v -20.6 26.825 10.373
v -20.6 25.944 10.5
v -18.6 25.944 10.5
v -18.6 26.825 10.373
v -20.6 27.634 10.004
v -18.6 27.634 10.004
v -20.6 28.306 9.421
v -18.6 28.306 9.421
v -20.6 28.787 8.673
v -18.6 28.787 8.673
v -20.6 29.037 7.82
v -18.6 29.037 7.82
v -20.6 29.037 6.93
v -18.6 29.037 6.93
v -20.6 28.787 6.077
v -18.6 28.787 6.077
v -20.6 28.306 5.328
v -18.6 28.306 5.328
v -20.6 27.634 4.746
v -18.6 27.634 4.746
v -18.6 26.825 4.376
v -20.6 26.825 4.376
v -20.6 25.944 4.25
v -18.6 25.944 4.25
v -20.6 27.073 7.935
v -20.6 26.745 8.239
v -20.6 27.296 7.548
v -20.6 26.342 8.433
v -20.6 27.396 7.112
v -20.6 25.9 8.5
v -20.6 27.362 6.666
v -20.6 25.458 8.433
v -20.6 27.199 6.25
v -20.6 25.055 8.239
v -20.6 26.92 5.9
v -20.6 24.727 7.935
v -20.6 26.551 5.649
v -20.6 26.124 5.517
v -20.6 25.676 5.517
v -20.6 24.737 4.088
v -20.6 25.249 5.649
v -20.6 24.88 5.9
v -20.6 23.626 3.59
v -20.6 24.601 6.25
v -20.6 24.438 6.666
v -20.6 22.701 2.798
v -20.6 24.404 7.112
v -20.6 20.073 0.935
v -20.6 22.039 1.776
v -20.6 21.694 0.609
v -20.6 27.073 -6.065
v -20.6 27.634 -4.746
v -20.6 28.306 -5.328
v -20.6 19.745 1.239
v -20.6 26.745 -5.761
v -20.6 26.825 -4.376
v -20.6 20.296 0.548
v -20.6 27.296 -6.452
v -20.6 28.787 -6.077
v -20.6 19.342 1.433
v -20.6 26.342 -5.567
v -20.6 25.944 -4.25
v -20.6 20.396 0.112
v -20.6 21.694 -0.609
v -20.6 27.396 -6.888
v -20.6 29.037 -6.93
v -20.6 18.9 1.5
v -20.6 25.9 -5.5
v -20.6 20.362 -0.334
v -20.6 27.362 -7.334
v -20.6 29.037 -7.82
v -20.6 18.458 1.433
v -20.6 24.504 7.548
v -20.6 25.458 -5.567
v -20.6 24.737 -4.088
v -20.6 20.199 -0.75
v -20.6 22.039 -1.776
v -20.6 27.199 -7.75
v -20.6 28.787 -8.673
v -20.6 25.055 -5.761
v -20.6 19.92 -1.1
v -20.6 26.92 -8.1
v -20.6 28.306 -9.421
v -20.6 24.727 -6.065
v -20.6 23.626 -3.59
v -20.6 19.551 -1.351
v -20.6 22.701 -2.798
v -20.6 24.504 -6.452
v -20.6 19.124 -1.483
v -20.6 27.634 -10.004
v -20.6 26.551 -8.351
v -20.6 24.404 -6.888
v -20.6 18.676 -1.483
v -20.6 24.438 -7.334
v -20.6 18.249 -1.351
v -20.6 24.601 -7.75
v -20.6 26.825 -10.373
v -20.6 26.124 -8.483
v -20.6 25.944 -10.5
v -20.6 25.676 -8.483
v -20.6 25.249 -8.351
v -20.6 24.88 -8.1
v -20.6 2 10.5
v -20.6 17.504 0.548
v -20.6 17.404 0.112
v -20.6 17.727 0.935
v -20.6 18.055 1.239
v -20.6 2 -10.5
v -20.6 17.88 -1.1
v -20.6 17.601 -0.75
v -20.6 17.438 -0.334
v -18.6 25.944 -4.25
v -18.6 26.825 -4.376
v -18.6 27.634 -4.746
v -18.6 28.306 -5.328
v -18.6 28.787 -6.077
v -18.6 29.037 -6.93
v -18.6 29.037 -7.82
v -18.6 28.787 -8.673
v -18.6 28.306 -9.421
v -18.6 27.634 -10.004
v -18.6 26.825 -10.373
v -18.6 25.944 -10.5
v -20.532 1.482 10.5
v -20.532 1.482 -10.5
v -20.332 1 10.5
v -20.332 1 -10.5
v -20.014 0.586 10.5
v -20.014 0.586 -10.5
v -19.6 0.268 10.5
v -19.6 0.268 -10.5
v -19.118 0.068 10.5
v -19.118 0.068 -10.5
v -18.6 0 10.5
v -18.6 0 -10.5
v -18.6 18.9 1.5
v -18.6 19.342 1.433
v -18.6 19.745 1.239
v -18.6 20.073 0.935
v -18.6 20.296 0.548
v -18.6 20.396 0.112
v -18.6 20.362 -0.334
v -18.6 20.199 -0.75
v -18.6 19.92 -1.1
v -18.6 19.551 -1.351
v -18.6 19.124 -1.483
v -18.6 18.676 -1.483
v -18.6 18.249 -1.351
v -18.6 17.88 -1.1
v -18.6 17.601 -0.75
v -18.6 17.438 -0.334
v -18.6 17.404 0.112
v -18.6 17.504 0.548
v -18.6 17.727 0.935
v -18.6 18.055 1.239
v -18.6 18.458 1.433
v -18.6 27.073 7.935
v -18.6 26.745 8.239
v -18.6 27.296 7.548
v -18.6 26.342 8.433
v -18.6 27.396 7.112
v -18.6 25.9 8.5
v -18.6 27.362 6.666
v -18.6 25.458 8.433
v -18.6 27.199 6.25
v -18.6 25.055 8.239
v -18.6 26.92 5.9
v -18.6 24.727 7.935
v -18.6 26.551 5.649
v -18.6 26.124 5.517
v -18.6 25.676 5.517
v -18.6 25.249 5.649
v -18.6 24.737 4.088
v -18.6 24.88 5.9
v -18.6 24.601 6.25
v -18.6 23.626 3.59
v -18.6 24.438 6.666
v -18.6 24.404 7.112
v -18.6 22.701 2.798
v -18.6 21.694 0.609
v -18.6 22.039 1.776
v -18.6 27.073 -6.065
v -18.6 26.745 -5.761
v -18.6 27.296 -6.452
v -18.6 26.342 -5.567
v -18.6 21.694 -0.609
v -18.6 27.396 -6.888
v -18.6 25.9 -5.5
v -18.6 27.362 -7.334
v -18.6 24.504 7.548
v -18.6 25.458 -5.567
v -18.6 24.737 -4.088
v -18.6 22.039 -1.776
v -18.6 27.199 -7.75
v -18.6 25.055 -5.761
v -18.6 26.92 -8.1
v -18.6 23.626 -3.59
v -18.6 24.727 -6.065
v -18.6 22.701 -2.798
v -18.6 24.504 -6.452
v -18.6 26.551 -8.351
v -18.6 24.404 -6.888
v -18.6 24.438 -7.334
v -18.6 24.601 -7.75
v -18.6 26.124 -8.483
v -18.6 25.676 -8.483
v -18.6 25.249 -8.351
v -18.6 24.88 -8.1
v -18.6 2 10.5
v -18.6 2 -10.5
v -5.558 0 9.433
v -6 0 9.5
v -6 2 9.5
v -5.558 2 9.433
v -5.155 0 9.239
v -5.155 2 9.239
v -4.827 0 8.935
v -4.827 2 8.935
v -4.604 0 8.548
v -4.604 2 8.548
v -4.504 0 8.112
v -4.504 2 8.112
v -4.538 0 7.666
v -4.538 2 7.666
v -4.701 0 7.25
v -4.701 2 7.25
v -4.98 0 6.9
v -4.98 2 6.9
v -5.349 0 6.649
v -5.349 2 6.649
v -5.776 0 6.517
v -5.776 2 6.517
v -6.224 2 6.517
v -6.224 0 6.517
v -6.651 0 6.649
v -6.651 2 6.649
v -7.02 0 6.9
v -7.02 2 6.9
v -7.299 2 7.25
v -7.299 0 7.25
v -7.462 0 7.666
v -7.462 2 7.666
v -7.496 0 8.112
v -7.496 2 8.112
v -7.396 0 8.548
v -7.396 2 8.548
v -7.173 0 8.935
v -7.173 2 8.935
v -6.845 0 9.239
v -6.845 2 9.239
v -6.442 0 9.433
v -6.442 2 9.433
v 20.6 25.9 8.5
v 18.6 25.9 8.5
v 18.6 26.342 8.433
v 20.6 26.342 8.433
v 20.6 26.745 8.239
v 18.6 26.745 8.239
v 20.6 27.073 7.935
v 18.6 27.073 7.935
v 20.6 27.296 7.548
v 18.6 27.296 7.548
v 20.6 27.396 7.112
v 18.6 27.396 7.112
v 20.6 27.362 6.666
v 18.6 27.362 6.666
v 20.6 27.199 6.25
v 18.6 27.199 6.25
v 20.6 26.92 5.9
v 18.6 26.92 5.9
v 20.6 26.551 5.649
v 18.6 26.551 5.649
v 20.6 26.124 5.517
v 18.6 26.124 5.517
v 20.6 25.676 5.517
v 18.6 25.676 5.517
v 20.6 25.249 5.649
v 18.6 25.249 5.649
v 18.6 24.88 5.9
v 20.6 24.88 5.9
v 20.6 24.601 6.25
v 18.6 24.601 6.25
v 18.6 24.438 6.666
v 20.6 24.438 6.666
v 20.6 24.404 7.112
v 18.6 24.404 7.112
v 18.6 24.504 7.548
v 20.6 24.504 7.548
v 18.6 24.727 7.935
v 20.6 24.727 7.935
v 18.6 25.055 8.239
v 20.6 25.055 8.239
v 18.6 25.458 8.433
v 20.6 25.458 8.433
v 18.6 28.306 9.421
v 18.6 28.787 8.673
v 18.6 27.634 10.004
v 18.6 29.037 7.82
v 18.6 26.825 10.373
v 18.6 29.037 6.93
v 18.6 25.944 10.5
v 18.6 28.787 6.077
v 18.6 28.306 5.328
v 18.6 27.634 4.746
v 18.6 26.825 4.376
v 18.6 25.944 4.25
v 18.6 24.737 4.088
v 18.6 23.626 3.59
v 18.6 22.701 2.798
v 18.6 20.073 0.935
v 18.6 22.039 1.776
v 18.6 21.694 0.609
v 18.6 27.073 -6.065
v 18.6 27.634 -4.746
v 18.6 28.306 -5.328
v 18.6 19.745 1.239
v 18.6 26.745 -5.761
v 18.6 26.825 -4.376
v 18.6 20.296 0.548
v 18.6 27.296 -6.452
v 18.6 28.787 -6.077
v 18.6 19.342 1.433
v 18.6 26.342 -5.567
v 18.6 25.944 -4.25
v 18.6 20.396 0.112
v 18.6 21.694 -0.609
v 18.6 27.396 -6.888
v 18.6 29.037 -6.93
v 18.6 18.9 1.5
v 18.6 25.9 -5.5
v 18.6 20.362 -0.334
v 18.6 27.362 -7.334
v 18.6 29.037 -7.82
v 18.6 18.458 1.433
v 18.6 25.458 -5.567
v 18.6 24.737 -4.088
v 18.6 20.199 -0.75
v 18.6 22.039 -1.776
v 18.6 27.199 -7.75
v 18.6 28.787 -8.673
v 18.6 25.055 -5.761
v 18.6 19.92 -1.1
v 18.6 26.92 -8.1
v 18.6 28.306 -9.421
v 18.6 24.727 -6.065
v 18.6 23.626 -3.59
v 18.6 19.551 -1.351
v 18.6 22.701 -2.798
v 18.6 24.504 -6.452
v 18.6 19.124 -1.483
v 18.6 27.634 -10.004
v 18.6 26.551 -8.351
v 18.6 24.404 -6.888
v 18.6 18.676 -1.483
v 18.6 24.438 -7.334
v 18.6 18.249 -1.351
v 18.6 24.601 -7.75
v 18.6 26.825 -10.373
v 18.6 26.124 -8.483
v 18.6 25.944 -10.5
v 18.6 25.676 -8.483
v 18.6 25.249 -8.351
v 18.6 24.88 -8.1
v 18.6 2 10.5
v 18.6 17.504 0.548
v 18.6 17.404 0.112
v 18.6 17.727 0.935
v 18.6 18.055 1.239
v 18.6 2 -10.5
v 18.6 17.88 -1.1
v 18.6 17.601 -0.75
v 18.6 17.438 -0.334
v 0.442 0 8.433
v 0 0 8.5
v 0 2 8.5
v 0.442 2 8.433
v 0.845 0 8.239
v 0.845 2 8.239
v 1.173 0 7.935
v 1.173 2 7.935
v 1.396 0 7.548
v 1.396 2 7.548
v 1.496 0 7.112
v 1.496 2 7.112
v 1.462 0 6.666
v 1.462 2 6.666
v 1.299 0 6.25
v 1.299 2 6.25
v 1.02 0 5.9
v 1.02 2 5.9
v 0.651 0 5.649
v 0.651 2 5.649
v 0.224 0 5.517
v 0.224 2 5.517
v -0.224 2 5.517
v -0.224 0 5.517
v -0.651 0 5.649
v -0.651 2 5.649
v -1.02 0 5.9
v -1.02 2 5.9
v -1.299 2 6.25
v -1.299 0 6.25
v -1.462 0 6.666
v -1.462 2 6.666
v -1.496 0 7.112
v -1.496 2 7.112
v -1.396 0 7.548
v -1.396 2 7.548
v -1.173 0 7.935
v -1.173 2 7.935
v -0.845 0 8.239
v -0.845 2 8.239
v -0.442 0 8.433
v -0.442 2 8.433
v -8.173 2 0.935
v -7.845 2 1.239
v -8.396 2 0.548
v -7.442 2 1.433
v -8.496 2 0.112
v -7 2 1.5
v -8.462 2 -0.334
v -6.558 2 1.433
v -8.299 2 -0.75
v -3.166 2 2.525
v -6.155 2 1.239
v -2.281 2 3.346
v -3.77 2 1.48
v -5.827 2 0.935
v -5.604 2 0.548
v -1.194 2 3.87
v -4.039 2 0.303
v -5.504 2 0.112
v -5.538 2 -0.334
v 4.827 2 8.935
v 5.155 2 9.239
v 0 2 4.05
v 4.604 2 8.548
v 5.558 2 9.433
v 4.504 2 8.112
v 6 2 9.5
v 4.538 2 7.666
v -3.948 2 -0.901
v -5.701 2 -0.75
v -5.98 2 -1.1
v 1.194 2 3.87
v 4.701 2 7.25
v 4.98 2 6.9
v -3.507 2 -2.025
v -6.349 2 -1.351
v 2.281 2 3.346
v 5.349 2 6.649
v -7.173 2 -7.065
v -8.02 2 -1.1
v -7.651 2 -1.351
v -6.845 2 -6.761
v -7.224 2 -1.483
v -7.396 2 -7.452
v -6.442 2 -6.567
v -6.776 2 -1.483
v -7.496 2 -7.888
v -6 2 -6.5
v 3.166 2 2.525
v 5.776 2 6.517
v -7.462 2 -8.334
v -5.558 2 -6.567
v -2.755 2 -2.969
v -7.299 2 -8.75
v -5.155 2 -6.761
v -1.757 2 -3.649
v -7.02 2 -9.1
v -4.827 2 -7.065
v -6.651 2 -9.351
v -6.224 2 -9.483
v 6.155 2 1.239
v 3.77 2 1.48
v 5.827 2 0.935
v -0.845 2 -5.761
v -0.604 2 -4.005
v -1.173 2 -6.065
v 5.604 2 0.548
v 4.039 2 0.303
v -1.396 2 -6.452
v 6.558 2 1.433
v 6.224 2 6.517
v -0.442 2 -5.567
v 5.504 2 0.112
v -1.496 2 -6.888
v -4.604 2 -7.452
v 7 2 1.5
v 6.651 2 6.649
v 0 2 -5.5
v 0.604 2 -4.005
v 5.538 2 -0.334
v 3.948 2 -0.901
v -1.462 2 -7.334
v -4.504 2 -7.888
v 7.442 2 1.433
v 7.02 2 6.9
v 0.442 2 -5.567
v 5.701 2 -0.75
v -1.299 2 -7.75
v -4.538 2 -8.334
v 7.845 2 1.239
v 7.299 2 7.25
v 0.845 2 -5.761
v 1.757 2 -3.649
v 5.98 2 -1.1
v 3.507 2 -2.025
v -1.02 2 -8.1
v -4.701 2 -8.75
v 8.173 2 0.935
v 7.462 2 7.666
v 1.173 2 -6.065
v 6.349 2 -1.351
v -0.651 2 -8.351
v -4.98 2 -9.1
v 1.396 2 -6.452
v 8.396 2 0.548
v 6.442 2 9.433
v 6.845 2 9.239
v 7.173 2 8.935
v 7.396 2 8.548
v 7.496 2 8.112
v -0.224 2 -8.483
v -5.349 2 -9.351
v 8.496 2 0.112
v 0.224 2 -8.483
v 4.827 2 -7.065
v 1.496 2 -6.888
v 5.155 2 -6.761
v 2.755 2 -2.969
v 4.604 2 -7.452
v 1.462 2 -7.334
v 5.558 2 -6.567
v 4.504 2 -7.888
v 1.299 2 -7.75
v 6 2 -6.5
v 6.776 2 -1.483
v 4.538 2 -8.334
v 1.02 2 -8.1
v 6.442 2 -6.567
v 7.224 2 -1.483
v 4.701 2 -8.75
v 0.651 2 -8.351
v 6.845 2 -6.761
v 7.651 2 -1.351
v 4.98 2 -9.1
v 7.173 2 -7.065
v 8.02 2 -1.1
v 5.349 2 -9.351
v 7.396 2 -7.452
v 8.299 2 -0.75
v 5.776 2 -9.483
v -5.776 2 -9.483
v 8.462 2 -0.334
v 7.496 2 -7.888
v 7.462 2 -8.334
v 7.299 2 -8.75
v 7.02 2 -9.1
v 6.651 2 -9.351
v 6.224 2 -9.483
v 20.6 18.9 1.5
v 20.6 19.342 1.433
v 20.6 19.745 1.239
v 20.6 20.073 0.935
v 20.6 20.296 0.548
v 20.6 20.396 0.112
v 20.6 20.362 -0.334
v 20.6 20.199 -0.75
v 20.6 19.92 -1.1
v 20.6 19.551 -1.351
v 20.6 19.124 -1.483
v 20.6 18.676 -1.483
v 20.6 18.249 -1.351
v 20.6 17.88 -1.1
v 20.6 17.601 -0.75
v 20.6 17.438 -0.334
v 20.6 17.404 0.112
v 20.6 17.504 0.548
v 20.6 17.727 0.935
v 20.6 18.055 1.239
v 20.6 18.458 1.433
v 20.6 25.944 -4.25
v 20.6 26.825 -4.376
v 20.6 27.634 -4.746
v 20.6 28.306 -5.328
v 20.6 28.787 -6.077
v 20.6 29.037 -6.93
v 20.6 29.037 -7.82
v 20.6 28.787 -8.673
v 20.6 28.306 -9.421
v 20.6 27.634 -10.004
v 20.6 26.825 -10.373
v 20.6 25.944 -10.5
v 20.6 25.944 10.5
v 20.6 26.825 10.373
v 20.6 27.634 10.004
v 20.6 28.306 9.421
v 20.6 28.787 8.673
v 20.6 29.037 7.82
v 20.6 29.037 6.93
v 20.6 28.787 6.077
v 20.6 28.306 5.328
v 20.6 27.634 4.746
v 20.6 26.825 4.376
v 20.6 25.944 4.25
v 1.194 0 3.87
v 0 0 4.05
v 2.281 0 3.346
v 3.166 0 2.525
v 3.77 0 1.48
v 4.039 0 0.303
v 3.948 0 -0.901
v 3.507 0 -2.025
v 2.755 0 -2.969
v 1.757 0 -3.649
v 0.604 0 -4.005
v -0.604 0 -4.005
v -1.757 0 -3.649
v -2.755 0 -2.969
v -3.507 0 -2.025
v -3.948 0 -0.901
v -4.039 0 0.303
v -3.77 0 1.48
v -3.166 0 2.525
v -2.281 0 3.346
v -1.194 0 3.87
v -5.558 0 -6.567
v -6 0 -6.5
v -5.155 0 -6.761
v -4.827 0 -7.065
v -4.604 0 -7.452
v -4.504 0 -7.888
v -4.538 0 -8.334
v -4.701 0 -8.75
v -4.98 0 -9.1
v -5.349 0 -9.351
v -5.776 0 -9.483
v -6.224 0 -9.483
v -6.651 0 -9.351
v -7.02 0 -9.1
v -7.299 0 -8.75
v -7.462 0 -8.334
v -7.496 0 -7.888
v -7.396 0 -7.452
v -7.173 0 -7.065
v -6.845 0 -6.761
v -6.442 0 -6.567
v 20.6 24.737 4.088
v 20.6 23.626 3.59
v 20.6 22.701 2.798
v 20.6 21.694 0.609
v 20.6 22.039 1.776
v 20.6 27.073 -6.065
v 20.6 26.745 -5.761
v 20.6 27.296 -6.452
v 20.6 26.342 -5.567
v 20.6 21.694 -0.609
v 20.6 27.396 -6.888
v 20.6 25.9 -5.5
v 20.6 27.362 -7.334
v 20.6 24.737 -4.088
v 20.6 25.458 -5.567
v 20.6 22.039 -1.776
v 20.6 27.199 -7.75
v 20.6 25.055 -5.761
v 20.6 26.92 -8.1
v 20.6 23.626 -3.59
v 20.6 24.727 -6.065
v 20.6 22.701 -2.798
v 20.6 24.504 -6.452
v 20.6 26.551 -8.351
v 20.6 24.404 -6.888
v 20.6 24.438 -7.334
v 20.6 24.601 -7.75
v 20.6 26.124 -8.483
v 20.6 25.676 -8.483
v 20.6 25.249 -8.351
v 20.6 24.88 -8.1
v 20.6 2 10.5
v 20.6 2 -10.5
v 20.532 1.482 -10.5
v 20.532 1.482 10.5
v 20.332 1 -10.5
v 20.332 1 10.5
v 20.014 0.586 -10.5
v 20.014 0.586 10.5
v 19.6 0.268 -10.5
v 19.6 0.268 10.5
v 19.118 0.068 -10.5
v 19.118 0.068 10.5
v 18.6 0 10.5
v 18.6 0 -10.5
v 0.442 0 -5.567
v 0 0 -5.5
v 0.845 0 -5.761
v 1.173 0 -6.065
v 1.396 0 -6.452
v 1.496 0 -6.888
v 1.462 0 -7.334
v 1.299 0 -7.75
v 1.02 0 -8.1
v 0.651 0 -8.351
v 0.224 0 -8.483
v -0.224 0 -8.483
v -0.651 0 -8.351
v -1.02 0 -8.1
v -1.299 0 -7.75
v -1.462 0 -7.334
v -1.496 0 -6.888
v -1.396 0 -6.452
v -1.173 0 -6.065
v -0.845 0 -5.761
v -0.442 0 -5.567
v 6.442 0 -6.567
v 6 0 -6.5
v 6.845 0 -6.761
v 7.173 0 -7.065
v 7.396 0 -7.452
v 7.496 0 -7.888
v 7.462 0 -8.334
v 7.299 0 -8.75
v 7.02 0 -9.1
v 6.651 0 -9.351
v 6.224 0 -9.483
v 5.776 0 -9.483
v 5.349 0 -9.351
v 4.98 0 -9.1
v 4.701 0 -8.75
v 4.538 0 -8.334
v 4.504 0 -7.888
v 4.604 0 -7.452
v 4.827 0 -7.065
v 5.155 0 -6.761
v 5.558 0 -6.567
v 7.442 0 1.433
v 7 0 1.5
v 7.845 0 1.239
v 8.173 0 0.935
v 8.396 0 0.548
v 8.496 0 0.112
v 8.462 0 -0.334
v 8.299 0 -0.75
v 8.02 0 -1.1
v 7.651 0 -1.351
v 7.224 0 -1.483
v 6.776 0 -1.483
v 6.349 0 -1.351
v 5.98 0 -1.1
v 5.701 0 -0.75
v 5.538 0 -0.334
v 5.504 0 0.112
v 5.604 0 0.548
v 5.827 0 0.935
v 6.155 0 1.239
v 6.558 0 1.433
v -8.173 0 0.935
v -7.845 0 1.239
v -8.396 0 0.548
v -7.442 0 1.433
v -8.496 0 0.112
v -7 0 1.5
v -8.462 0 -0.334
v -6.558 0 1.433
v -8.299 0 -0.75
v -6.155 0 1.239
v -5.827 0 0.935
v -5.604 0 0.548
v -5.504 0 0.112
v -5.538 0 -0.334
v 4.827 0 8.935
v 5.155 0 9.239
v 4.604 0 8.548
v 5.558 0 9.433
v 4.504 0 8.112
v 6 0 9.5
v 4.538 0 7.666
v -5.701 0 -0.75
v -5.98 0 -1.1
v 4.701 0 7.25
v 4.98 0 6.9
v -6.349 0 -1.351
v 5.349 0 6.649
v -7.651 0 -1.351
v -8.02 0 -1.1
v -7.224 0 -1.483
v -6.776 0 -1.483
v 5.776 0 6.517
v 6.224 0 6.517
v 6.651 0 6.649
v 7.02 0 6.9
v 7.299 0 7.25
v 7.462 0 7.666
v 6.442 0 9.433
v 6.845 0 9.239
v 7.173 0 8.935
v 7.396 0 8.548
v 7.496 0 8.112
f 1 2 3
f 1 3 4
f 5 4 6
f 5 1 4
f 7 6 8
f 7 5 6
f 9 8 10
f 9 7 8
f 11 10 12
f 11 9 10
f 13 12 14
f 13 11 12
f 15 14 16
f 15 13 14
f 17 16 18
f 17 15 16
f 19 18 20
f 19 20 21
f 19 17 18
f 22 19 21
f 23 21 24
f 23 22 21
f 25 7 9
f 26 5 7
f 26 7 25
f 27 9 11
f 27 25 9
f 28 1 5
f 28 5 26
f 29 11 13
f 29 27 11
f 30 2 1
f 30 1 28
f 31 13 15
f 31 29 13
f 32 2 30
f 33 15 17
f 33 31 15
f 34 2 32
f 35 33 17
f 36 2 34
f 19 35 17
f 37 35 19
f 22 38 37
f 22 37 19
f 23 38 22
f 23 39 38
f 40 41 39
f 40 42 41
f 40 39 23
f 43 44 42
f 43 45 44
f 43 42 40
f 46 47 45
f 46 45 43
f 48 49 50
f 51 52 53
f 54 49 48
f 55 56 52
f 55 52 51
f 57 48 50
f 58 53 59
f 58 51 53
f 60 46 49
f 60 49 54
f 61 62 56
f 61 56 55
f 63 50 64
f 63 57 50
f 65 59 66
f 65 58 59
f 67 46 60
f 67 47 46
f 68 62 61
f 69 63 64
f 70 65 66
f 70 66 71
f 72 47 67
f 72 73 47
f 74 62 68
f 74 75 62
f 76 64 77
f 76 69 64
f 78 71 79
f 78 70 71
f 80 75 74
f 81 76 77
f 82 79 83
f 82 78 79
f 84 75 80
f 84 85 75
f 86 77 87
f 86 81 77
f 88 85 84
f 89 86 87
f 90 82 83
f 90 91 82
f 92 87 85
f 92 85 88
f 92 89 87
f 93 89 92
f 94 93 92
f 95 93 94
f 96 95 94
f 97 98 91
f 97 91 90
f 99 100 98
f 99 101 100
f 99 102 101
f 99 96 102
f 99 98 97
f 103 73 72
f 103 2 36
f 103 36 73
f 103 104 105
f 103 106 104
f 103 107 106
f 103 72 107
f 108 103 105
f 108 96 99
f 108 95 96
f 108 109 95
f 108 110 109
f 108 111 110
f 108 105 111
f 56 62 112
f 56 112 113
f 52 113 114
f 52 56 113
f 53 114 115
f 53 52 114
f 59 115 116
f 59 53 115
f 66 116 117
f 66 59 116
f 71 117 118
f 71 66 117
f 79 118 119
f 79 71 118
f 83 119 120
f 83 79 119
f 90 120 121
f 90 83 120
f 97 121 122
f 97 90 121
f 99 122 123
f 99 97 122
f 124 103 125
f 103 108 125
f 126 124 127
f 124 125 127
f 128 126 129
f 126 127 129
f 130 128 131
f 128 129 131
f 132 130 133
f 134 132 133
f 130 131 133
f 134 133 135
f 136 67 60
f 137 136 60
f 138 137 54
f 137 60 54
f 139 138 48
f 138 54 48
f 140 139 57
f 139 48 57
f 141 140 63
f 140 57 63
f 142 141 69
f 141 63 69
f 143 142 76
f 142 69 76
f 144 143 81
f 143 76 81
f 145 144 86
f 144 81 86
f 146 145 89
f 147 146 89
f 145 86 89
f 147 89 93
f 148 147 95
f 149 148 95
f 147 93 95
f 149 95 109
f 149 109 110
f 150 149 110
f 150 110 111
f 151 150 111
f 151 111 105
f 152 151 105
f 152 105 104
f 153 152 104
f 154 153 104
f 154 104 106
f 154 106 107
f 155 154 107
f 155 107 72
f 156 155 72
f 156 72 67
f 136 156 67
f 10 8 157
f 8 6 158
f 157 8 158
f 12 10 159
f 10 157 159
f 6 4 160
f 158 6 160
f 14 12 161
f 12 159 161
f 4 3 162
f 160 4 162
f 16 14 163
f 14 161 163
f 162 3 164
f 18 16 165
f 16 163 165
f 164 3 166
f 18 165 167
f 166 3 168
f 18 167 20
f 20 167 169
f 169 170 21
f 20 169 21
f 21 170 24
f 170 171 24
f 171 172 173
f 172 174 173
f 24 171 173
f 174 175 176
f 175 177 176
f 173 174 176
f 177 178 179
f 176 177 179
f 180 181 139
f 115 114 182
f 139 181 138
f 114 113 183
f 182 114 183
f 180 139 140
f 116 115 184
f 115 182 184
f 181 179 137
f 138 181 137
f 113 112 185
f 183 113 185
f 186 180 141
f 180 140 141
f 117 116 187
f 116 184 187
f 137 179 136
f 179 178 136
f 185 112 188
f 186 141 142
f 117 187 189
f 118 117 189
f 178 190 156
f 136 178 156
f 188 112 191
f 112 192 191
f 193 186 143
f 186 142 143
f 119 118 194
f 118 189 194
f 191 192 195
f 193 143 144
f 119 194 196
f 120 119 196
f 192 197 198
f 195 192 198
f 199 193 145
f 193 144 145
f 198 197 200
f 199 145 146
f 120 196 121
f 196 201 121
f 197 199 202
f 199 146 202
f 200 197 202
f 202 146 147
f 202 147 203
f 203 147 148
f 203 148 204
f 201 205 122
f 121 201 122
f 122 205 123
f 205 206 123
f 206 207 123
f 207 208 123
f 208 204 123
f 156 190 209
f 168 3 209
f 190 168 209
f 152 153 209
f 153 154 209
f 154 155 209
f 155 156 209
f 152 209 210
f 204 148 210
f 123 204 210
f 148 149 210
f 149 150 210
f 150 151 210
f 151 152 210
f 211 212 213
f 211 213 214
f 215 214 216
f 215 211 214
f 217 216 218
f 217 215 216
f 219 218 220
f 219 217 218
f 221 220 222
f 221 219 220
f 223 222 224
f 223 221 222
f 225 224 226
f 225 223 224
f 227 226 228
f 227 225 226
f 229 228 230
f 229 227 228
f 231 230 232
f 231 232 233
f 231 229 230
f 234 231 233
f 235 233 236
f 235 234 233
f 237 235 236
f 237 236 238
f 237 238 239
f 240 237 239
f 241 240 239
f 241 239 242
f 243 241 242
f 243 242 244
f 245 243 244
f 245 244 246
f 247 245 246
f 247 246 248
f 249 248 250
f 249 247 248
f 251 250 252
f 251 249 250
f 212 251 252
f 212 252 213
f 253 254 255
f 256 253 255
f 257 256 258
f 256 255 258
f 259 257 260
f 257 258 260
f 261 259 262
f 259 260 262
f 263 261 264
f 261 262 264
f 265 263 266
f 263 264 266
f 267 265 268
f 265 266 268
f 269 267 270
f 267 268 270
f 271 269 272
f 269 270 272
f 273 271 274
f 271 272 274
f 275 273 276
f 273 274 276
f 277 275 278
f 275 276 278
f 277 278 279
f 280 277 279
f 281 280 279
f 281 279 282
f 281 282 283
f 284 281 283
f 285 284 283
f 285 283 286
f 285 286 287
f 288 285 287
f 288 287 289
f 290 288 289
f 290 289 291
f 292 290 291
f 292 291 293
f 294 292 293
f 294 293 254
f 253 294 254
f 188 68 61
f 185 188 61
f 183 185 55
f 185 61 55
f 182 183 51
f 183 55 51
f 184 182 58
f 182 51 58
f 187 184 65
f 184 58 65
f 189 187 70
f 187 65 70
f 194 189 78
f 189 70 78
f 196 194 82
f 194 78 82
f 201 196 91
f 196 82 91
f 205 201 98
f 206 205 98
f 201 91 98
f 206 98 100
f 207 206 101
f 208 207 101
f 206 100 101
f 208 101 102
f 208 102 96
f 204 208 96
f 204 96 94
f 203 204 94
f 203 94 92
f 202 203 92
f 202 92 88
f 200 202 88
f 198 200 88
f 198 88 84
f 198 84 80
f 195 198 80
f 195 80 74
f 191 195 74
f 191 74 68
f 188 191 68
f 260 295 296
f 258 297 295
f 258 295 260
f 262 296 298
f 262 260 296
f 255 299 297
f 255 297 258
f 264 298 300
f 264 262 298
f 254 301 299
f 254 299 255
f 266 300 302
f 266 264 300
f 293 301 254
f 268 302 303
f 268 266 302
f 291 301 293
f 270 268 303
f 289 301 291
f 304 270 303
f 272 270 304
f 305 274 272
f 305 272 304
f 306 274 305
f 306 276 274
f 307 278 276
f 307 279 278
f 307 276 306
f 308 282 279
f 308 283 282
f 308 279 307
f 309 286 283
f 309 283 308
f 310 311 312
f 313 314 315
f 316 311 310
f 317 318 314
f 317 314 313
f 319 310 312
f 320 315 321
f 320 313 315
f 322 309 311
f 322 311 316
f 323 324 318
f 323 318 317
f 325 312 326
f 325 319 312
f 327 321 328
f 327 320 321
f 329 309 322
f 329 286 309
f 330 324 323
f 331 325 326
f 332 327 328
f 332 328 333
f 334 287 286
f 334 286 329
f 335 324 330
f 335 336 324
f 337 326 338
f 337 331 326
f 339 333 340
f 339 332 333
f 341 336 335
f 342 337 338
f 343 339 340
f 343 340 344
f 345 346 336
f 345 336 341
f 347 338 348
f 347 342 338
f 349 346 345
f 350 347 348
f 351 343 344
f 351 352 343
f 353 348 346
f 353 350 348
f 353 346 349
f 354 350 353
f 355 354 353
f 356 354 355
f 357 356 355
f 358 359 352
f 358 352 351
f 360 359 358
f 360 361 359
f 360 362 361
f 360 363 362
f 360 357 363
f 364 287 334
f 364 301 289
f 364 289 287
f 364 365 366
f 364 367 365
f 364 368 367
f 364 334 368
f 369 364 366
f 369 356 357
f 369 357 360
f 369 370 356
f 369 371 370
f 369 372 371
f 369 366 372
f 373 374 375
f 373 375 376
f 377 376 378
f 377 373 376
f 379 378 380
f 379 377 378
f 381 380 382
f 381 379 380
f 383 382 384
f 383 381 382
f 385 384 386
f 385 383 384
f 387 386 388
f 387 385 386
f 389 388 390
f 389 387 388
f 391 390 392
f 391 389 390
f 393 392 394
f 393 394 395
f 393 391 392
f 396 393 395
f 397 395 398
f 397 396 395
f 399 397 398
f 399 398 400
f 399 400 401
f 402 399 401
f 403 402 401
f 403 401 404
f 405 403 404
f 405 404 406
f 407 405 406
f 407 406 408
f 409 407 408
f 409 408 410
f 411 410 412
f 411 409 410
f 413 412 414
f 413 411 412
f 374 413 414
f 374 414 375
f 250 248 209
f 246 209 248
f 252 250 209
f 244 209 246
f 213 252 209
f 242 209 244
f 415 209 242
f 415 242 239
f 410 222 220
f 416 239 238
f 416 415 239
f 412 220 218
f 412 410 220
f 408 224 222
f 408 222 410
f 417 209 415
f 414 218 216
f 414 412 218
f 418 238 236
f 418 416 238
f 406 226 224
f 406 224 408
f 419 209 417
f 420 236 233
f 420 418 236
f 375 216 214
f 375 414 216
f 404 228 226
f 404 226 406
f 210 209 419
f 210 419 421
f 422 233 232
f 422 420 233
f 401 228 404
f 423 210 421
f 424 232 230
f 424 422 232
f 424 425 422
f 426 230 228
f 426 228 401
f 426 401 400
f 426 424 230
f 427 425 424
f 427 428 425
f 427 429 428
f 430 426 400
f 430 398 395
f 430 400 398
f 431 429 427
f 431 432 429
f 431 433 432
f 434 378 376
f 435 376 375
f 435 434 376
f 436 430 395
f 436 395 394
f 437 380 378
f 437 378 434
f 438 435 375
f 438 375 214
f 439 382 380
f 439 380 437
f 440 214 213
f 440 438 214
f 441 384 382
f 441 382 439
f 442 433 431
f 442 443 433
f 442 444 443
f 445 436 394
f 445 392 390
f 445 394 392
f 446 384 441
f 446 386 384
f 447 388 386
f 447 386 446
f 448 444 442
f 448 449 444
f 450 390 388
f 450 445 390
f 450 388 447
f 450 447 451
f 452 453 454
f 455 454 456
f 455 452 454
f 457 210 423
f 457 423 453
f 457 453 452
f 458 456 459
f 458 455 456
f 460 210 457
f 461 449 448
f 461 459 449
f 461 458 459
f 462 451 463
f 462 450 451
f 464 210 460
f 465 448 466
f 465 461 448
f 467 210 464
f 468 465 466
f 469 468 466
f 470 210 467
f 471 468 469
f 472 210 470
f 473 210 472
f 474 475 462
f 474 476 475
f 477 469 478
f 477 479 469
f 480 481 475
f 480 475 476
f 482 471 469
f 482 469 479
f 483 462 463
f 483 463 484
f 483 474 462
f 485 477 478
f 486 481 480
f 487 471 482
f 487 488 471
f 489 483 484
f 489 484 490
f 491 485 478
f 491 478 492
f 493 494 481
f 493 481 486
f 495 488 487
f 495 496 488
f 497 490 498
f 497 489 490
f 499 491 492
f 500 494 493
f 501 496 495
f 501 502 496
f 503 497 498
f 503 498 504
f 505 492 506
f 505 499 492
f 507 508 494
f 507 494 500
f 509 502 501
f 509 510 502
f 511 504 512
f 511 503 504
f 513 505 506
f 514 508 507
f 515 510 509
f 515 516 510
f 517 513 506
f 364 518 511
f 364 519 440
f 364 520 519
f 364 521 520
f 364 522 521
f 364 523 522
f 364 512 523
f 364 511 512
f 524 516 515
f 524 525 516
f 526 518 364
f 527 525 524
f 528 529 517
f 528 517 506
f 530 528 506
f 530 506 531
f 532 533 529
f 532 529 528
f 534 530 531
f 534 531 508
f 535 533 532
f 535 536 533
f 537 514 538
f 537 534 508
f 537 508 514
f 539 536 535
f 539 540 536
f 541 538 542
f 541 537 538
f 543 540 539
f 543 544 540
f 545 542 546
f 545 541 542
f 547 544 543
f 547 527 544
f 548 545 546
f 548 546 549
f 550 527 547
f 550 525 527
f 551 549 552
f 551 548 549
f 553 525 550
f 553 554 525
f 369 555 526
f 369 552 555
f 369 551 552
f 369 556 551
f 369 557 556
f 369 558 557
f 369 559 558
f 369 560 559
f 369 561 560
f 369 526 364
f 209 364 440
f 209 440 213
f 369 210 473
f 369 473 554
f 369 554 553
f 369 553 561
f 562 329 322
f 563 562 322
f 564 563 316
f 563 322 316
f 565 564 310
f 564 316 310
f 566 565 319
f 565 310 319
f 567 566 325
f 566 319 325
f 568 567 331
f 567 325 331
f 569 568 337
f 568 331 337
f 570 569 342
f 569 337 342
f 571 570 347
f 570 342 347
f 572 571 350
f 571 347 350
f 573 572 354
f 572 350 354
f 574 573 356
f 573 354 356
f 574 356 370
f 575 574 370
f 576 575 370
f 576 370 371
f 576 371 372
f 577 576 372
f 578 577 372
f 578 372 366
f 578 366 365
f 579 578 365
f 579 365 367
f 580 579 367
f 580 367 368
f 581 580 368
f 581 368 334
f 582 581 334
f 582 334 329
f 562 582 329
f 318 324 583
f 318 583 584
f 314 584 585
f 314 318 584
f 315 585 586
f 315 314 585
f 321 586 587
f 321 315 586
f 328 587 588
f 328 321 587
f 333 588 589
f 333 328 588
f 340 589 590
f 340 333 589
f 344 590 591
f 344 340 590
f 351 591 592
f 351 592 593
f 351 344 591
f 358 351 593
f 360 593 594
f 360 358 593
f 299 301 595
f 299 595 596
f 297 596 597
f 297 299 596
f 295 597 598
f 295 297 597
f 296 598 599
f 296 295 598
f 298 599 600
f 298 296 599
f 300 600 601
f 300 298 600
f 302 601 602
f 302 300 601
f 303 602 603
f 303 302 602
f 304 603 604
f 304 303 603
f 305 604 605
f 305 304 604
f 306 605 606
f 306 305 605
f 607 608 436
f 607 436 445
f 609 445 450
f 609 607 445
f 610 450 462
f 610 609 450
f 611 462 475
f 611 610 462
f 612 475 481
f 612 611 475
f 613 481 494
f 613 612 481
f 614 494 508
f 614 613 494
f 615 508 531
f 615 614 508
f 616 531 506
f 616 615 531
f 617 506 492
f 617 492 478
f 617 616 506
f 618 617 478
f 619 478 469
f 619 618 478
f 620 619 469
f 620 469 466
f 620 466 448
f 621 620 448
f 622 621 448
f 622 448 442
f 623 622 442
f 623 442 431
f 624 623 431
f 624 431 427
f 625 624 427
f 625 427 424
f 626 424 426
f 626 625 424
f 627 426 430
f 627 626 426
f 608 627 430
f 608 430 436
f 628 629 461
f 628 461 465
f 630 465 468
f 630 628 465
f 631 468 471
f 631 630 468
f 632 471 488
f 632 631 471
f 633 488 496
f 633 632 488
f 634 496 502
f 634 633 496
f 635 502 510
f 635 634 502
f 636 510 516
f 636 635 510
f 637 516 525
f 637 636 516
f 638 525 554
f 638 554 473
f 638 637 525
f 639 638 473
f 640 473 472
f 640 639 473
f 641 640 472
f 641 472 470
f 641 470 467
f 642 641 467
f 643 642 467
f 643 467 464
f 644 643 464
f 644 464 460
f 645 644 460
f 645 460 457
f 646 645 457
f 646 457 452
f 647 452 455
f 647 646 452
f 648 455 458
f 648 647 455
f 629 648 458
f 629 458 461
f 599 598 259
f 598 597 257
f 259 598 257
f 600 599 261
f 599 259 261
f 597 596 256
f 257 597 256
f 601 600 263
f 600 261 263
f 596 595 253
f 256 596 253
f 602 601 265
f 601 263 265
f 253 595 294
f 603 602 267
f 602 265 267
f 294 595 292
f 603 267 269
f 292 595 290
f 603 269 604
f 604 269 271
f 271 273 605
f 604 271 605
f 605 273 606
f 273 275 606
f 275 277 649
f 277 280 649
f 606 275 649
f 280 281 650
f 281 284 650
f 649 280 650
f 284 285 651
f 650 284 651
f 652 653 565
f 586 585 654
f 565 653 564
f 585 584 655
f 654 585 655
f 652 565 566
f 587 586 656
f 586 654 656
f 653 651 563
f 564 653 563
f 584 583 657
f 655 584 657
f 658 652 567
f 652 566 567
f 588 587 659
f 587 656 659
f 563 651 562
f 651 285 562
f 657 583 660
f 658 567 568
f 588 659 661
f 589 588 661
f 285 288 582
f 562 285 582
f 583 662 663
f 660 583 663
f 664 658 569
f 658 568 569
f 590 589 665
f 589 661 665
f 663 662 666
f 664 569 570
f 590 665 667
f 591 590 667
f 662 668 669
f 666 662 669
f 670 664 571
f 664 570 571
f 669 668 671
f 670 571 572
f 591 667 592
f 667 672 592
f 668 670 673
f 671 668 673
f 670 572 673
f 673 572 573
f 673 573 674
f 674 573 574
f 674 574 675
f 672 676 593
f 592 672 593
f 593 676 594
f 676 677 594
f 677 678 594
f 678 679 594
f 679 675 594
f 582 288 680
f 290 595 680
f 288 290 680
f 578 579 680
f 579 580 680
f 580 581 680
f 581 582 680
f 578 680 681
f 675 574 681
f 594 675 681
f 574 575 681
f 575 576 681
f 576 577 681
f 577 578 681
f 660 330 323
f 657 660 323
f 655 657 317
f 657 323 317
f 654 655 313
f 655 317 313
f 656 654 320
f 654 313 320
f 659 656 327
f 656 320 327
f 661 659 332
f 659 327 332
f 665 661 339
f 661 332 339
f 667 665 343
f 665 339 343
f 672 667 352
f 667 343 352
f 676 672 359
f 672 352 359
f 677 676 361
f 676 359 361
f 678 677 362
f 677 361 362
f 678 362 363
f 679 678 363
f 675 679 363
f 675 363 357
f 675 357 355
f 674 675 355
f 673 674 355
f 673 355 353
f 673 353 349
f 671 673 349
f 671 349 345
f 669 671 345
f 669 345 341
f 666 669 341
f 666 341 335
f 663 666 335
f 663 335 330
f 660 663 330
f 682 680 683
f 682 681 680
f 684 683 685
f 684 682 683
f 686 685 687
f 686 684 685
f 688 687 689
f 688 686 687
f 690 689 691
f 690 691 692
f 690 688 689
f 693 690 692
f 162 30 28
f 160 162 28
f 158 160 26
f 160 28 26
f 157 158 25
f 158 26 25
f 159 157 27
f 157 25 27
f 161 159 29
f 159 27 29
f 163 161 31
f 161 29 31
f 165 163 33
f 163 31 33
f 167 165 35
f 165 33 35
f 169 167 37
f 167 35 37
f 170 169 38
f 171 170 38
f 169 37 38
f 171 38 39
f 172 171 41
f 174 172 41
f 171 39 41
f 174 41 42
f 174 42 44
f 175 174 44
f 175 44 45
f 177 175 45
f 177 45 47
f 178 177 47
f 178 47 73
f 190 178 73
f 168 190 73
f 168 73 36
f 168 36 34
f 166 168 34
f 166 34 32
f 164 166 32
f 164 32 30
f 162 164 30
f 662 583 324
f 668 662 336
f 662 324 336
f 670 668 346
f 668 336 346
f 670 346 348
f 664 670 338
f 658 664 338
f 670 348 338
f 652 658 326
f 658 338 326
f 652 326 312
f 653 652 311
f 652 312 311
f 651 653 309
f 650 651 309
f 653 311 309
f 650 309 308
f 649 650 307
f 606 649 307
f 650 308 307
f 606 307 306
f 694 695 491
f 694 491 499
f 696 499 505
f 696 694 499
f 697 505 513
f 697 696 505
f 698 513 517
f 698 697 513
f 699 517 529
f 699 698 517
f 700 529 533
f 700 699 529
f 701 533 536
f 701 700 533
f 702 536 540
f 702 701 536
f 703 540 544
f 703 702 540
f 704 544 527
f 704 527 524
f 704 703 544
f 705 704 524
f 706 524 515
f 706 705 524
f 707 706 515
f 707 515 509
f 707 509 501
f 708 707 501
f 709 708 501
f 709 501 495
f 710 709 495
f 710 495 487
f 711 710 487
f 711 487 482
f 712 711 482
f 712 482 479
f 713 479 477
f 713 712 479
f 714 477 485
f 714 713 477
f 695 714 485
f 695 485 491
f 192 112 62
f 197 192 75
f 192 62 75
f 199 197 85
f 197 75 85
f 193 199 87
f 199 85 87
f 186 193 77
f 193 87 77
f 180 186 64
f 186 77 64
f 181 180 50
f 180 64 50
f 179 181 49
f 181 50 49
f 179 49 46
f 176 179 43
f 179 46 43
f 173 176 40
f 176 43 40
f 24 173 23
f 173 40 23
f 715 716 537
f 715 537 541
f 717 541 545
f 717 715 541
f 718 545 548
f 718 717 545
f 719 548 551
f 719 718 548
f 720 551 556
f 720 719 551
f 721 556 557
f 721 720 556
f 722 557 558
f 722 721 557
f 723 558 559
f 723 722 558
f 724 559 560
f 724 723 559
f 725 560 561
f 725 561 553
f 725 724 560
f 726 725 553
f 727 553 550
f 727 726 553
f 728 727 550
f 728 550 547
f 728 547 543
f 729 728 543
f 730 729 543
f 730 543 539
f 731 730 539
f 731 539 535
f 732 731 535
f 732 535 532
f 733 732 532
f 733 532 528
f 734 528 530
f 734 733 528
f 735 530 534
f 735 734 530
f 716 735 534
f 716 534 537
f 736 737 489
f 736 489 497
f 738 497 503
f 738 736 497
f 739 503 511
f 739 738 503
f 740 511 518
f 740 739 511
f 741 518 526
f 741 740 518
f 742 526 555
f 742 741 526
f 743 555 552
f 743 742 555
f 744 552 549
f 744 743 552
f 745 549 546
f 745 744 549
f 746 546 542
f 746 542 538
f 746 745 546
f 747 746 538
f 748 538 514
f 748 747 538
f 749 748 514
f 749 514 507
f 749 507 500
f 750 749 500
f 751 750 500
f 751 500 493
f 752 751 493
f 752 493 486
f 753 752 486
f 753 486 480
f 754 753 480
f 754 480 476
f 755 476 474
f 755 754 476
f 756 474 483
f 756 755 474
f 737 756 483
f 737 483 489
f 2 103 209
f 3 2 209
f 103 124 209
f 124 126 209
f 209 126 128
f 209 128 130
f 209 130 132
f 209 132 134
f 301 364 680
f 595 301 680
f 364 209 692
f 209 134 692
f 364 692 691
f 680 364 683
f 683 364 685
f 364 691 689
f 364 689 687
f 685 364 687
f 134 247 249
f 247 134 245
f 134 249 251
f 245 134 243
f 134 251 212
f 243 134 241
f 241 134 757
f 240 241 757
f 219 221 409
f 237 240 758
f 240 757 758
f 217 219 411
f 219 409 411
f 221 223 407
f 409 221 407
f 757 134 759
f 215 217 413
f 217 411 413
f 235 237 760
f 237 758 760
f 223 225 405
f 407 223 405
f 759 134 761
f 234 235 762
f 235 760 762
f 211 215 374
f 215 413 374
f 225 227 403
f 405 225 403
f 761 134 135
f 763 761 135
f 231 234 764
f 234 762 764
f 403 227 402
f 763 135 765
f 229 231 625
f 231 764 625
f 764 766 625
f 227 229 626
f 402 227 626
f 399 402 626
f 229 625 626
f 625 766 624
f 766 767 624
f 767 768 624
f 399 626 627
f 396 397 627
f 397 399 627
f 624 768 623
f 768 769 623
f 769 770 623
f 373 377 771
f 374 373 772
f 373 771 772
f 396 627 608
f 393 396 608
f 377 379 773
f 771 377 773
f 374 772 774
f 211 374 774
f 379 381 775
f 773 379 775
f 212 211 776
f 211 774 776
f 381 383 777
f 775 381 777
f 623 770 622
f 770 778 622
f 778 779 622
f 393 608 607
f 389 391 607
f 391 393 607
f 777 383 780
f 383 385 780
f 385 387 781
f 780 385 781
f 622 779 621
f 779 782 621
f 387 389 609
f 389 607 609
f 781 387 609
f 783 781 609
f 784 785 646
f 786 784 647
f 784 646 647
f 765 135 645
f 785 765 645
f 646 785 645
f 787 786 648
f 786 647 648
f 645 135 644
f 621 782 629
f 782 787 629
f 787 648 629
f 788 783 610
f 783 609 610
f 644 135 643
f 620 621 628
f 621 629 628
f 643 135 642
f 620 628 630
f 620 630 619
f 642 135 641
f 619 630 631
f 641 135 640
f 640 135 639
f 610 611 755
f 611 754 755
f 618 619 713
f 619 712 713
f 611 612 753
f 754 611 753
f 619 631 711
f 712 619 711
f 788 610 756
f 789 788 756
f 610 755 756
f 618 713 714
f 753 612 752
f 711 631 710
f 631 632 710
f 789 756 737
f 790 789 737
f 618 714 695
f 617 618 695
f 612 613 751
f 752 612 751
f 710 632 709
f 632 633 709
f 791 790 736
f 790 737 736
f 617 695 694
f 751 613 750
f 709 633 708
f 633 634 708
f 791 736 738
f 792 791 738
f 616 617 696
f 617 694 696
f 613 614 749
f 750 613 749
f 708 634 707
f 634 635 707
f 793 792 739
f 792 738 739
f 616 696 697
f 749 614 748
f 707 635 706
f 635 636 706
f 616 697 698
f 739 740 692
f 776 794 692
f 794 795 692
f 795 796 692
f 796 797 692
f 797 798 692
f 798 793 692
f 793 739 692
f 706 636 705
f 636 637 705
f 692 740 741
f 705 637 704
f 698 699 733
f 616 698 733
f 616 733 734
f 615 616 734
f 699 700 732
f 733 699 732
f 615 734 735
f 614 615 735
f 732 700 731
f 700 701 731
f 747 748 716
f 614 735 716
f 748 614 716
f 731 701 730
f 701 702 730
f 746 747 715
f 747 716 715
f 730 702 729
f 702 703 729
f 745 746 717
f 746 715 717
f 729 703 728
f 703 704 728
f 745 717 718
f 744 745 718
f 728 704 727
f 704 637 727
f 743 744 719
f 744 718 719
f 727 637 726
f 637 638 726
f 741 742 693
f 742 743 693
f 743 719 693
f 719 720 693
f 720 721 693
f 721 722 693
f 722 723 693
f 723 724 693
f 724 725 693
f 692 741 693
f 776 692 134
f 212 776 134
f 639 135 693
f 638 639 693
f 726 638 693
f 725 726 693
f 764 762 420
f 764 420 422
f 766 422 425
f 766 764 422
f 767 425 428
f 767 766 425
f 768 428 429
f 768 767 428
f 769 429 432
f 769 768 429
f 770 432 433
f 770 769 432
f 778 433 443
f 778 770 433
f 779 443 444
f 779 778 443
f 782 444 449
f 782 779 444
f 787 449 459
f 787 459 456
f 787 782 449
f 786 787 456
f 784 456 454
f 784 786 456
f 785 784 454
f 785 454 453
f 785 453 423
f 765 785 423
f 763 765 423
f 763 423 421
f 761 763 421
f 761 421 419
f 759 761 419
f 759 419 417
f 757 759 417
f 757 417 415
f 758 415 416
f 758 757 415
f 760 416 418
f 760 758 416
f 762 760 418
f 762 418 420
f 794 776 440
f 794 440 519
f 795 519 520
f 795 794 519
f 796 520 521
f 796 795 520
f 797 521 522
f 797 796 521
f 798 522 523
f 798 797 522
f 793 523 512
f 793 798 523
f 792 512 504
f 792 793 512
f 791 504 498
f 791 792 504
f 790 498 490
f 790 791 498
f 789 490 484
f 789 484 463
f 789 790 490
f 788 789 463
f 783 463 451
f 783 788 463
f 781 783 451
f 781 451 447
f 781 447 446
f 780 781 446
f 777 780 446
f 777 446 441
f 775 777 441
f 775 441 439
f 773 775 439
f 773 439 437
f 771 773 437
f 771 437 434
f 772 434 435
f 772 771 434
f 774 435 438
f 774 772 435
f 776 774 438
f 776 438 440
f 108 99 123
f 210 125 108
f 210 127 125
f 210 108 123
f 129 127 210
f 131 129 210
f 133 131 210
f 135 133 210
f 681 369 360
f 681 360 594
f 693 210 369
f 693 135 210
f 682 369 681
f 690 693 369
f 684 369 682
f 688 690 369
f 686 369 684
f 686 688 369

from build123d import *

# Parameters (mm, degrees)
SKETCH1_W           = 41.2
SKETCH1_H           = 21
SKETCH1_R           = 4.05
SKETCH1_R_2         = 1.5
BOSS_EXTRUDE1_DEPTH = 2
SKETCH2_W           = 2
SKETCH2_H           = 21
BOSS_EXTRUDE2_DEPTH = 28.2
SKETCH3_R           = 1.5
SKETCH3_R_2         = 4.25
CUT_EXTRUDE1_DEPTH  = 53.151030671
CUT_EXTRUDE2_DEPTH  = 53.151030671
FILLET1_R           = 2


with BuildPart() as part:
    # Sketch1 → Boss-Extrude1 (new body)
    with BuildSketch(Plane(origin=(0, 0, 0), x_dir=(1, 0, 0), z_dir=(0, 1, 0))):
        Rectangle(SKETCH1_W, SKETCH1_H)
        with Locations(Location((0, 0, 0), (0, 0, 270))):
            Circle(SKETCH1_R, mode=Mode.SUBTRACT)
        with Locations(Location((0, 7, 0), (0, 0, 270))):
            Circle(SKETCH1_R_2, mode=Mode.SUBTRACT)
        with Locations(Location((7, 0, 0), (0, 0, 270))):
            Circle(SKETCH1_R_2, mode=Mode.SUBTRACT)
        with Locations(Location((0, -7, 0), (0, 0, 270))):
            Circle(SKETCH1_R_2, mode=Mode.SUBTRACT)
        with Locations(Location((-7, 0, 0), (0, 0, 270))):
            Circle(SKETCH1_R_2, mode=Mode.SUBTRACT)
        with Locations(Location((6, -8, 0), (0, 0, 270))):
            Circle(SKETCH1_R_2, mode=Mode.SUBTRACT)
        with Locations(Location((6, 8, 0), (0, 0, 270))):
            Circle(SKETCH1_R_2, mode=Mode.SUBTRACT)
        with Locations(Location((-6, 8, 0), (0, 0, 270))):
            Circle(SKETCH1_R_2, mode=Mode.SUBTRACT)
        with Locations(Location((-6, -8, 0), (0, 0, 270))):
            Circle(SKETCH1_R_2, mode=Mode.SUBTRACT)
    extrude(amount=BOSS_EXTRUDE1_DEPTH)

    # Sketch2 → Boss-Extrude2 (add)
    with BuildSketch(Plane(origin=(0, 2, 0), x_dir=(1, 0, 0), z_dir=(0, 1, 0))):
        with Locations((-19.6, 0)):
            Rectangle(SKETCH2_W, SKETCH2_H)
        with Locations((19.6, 0)):
            Rectangle(SKETCH2_W, SKETCH2_H)
    extrude(amount=BOSS_EXTRUDE2_DEPTH)

    # Sketch3 → Cut-Extrude1 (cut, through all)
    with BuildSketch(Plane.ZY.offset(20.6)):
        with Locations((-7, 25.9)):
            Circle(SKETCH3_R)
        with Locations((0, 18.9)):
            Circle(SKETCH3_R)
        with Locations((7, 25.9)):
            Circle(SKETCH3_R)
        with Locations((0, 25.9)):
            Circle(SKETCH3_R_2)
    extrude(amount=-CUT_EXTRUDE1_DEPTH, mode=Mode.SUBTRACT)

    # Sketch4 → Cut-Extrude2 (cut, through all)
    with BuildSketch(Plane.ZY.offset(20.6)):
        with BuildLine():
            Line((-10.5, 25.944077053), (-10.5, 30.2))
            Line((-10.5, 30.2), (10.5, 30.2))
            Line((10.5, 30.2), (10.5, 25.944076968))
            ThreePointArc((10.5, 25.944076968), (7.374885716, 29.069191252), (4.249771432, 25.944076968))
            ThreePointArc((4.249771432, 25.944076968), (0, 21.69430542), (-4.249771432, 25.944076968))
            ThreePointArc((-4.249771432, 25.944076968), (-7.374885673, 29.069191338), (-10.5, 25.944077053))
        make_face()
    extrude(amount=-CUT_EXTRUDE2_DEPTH, mode=Mode.SUBTRACT)

    # Fillet1
    fillet1_edges = [part.edges().sort_by_distance(p)[0] for p in [
        (20.6, 0, 0),
        (-20.6, 0, 0),
    ]]
    fillet(fillet1_edges, radius=FILLET1_R)


solid = part.part
